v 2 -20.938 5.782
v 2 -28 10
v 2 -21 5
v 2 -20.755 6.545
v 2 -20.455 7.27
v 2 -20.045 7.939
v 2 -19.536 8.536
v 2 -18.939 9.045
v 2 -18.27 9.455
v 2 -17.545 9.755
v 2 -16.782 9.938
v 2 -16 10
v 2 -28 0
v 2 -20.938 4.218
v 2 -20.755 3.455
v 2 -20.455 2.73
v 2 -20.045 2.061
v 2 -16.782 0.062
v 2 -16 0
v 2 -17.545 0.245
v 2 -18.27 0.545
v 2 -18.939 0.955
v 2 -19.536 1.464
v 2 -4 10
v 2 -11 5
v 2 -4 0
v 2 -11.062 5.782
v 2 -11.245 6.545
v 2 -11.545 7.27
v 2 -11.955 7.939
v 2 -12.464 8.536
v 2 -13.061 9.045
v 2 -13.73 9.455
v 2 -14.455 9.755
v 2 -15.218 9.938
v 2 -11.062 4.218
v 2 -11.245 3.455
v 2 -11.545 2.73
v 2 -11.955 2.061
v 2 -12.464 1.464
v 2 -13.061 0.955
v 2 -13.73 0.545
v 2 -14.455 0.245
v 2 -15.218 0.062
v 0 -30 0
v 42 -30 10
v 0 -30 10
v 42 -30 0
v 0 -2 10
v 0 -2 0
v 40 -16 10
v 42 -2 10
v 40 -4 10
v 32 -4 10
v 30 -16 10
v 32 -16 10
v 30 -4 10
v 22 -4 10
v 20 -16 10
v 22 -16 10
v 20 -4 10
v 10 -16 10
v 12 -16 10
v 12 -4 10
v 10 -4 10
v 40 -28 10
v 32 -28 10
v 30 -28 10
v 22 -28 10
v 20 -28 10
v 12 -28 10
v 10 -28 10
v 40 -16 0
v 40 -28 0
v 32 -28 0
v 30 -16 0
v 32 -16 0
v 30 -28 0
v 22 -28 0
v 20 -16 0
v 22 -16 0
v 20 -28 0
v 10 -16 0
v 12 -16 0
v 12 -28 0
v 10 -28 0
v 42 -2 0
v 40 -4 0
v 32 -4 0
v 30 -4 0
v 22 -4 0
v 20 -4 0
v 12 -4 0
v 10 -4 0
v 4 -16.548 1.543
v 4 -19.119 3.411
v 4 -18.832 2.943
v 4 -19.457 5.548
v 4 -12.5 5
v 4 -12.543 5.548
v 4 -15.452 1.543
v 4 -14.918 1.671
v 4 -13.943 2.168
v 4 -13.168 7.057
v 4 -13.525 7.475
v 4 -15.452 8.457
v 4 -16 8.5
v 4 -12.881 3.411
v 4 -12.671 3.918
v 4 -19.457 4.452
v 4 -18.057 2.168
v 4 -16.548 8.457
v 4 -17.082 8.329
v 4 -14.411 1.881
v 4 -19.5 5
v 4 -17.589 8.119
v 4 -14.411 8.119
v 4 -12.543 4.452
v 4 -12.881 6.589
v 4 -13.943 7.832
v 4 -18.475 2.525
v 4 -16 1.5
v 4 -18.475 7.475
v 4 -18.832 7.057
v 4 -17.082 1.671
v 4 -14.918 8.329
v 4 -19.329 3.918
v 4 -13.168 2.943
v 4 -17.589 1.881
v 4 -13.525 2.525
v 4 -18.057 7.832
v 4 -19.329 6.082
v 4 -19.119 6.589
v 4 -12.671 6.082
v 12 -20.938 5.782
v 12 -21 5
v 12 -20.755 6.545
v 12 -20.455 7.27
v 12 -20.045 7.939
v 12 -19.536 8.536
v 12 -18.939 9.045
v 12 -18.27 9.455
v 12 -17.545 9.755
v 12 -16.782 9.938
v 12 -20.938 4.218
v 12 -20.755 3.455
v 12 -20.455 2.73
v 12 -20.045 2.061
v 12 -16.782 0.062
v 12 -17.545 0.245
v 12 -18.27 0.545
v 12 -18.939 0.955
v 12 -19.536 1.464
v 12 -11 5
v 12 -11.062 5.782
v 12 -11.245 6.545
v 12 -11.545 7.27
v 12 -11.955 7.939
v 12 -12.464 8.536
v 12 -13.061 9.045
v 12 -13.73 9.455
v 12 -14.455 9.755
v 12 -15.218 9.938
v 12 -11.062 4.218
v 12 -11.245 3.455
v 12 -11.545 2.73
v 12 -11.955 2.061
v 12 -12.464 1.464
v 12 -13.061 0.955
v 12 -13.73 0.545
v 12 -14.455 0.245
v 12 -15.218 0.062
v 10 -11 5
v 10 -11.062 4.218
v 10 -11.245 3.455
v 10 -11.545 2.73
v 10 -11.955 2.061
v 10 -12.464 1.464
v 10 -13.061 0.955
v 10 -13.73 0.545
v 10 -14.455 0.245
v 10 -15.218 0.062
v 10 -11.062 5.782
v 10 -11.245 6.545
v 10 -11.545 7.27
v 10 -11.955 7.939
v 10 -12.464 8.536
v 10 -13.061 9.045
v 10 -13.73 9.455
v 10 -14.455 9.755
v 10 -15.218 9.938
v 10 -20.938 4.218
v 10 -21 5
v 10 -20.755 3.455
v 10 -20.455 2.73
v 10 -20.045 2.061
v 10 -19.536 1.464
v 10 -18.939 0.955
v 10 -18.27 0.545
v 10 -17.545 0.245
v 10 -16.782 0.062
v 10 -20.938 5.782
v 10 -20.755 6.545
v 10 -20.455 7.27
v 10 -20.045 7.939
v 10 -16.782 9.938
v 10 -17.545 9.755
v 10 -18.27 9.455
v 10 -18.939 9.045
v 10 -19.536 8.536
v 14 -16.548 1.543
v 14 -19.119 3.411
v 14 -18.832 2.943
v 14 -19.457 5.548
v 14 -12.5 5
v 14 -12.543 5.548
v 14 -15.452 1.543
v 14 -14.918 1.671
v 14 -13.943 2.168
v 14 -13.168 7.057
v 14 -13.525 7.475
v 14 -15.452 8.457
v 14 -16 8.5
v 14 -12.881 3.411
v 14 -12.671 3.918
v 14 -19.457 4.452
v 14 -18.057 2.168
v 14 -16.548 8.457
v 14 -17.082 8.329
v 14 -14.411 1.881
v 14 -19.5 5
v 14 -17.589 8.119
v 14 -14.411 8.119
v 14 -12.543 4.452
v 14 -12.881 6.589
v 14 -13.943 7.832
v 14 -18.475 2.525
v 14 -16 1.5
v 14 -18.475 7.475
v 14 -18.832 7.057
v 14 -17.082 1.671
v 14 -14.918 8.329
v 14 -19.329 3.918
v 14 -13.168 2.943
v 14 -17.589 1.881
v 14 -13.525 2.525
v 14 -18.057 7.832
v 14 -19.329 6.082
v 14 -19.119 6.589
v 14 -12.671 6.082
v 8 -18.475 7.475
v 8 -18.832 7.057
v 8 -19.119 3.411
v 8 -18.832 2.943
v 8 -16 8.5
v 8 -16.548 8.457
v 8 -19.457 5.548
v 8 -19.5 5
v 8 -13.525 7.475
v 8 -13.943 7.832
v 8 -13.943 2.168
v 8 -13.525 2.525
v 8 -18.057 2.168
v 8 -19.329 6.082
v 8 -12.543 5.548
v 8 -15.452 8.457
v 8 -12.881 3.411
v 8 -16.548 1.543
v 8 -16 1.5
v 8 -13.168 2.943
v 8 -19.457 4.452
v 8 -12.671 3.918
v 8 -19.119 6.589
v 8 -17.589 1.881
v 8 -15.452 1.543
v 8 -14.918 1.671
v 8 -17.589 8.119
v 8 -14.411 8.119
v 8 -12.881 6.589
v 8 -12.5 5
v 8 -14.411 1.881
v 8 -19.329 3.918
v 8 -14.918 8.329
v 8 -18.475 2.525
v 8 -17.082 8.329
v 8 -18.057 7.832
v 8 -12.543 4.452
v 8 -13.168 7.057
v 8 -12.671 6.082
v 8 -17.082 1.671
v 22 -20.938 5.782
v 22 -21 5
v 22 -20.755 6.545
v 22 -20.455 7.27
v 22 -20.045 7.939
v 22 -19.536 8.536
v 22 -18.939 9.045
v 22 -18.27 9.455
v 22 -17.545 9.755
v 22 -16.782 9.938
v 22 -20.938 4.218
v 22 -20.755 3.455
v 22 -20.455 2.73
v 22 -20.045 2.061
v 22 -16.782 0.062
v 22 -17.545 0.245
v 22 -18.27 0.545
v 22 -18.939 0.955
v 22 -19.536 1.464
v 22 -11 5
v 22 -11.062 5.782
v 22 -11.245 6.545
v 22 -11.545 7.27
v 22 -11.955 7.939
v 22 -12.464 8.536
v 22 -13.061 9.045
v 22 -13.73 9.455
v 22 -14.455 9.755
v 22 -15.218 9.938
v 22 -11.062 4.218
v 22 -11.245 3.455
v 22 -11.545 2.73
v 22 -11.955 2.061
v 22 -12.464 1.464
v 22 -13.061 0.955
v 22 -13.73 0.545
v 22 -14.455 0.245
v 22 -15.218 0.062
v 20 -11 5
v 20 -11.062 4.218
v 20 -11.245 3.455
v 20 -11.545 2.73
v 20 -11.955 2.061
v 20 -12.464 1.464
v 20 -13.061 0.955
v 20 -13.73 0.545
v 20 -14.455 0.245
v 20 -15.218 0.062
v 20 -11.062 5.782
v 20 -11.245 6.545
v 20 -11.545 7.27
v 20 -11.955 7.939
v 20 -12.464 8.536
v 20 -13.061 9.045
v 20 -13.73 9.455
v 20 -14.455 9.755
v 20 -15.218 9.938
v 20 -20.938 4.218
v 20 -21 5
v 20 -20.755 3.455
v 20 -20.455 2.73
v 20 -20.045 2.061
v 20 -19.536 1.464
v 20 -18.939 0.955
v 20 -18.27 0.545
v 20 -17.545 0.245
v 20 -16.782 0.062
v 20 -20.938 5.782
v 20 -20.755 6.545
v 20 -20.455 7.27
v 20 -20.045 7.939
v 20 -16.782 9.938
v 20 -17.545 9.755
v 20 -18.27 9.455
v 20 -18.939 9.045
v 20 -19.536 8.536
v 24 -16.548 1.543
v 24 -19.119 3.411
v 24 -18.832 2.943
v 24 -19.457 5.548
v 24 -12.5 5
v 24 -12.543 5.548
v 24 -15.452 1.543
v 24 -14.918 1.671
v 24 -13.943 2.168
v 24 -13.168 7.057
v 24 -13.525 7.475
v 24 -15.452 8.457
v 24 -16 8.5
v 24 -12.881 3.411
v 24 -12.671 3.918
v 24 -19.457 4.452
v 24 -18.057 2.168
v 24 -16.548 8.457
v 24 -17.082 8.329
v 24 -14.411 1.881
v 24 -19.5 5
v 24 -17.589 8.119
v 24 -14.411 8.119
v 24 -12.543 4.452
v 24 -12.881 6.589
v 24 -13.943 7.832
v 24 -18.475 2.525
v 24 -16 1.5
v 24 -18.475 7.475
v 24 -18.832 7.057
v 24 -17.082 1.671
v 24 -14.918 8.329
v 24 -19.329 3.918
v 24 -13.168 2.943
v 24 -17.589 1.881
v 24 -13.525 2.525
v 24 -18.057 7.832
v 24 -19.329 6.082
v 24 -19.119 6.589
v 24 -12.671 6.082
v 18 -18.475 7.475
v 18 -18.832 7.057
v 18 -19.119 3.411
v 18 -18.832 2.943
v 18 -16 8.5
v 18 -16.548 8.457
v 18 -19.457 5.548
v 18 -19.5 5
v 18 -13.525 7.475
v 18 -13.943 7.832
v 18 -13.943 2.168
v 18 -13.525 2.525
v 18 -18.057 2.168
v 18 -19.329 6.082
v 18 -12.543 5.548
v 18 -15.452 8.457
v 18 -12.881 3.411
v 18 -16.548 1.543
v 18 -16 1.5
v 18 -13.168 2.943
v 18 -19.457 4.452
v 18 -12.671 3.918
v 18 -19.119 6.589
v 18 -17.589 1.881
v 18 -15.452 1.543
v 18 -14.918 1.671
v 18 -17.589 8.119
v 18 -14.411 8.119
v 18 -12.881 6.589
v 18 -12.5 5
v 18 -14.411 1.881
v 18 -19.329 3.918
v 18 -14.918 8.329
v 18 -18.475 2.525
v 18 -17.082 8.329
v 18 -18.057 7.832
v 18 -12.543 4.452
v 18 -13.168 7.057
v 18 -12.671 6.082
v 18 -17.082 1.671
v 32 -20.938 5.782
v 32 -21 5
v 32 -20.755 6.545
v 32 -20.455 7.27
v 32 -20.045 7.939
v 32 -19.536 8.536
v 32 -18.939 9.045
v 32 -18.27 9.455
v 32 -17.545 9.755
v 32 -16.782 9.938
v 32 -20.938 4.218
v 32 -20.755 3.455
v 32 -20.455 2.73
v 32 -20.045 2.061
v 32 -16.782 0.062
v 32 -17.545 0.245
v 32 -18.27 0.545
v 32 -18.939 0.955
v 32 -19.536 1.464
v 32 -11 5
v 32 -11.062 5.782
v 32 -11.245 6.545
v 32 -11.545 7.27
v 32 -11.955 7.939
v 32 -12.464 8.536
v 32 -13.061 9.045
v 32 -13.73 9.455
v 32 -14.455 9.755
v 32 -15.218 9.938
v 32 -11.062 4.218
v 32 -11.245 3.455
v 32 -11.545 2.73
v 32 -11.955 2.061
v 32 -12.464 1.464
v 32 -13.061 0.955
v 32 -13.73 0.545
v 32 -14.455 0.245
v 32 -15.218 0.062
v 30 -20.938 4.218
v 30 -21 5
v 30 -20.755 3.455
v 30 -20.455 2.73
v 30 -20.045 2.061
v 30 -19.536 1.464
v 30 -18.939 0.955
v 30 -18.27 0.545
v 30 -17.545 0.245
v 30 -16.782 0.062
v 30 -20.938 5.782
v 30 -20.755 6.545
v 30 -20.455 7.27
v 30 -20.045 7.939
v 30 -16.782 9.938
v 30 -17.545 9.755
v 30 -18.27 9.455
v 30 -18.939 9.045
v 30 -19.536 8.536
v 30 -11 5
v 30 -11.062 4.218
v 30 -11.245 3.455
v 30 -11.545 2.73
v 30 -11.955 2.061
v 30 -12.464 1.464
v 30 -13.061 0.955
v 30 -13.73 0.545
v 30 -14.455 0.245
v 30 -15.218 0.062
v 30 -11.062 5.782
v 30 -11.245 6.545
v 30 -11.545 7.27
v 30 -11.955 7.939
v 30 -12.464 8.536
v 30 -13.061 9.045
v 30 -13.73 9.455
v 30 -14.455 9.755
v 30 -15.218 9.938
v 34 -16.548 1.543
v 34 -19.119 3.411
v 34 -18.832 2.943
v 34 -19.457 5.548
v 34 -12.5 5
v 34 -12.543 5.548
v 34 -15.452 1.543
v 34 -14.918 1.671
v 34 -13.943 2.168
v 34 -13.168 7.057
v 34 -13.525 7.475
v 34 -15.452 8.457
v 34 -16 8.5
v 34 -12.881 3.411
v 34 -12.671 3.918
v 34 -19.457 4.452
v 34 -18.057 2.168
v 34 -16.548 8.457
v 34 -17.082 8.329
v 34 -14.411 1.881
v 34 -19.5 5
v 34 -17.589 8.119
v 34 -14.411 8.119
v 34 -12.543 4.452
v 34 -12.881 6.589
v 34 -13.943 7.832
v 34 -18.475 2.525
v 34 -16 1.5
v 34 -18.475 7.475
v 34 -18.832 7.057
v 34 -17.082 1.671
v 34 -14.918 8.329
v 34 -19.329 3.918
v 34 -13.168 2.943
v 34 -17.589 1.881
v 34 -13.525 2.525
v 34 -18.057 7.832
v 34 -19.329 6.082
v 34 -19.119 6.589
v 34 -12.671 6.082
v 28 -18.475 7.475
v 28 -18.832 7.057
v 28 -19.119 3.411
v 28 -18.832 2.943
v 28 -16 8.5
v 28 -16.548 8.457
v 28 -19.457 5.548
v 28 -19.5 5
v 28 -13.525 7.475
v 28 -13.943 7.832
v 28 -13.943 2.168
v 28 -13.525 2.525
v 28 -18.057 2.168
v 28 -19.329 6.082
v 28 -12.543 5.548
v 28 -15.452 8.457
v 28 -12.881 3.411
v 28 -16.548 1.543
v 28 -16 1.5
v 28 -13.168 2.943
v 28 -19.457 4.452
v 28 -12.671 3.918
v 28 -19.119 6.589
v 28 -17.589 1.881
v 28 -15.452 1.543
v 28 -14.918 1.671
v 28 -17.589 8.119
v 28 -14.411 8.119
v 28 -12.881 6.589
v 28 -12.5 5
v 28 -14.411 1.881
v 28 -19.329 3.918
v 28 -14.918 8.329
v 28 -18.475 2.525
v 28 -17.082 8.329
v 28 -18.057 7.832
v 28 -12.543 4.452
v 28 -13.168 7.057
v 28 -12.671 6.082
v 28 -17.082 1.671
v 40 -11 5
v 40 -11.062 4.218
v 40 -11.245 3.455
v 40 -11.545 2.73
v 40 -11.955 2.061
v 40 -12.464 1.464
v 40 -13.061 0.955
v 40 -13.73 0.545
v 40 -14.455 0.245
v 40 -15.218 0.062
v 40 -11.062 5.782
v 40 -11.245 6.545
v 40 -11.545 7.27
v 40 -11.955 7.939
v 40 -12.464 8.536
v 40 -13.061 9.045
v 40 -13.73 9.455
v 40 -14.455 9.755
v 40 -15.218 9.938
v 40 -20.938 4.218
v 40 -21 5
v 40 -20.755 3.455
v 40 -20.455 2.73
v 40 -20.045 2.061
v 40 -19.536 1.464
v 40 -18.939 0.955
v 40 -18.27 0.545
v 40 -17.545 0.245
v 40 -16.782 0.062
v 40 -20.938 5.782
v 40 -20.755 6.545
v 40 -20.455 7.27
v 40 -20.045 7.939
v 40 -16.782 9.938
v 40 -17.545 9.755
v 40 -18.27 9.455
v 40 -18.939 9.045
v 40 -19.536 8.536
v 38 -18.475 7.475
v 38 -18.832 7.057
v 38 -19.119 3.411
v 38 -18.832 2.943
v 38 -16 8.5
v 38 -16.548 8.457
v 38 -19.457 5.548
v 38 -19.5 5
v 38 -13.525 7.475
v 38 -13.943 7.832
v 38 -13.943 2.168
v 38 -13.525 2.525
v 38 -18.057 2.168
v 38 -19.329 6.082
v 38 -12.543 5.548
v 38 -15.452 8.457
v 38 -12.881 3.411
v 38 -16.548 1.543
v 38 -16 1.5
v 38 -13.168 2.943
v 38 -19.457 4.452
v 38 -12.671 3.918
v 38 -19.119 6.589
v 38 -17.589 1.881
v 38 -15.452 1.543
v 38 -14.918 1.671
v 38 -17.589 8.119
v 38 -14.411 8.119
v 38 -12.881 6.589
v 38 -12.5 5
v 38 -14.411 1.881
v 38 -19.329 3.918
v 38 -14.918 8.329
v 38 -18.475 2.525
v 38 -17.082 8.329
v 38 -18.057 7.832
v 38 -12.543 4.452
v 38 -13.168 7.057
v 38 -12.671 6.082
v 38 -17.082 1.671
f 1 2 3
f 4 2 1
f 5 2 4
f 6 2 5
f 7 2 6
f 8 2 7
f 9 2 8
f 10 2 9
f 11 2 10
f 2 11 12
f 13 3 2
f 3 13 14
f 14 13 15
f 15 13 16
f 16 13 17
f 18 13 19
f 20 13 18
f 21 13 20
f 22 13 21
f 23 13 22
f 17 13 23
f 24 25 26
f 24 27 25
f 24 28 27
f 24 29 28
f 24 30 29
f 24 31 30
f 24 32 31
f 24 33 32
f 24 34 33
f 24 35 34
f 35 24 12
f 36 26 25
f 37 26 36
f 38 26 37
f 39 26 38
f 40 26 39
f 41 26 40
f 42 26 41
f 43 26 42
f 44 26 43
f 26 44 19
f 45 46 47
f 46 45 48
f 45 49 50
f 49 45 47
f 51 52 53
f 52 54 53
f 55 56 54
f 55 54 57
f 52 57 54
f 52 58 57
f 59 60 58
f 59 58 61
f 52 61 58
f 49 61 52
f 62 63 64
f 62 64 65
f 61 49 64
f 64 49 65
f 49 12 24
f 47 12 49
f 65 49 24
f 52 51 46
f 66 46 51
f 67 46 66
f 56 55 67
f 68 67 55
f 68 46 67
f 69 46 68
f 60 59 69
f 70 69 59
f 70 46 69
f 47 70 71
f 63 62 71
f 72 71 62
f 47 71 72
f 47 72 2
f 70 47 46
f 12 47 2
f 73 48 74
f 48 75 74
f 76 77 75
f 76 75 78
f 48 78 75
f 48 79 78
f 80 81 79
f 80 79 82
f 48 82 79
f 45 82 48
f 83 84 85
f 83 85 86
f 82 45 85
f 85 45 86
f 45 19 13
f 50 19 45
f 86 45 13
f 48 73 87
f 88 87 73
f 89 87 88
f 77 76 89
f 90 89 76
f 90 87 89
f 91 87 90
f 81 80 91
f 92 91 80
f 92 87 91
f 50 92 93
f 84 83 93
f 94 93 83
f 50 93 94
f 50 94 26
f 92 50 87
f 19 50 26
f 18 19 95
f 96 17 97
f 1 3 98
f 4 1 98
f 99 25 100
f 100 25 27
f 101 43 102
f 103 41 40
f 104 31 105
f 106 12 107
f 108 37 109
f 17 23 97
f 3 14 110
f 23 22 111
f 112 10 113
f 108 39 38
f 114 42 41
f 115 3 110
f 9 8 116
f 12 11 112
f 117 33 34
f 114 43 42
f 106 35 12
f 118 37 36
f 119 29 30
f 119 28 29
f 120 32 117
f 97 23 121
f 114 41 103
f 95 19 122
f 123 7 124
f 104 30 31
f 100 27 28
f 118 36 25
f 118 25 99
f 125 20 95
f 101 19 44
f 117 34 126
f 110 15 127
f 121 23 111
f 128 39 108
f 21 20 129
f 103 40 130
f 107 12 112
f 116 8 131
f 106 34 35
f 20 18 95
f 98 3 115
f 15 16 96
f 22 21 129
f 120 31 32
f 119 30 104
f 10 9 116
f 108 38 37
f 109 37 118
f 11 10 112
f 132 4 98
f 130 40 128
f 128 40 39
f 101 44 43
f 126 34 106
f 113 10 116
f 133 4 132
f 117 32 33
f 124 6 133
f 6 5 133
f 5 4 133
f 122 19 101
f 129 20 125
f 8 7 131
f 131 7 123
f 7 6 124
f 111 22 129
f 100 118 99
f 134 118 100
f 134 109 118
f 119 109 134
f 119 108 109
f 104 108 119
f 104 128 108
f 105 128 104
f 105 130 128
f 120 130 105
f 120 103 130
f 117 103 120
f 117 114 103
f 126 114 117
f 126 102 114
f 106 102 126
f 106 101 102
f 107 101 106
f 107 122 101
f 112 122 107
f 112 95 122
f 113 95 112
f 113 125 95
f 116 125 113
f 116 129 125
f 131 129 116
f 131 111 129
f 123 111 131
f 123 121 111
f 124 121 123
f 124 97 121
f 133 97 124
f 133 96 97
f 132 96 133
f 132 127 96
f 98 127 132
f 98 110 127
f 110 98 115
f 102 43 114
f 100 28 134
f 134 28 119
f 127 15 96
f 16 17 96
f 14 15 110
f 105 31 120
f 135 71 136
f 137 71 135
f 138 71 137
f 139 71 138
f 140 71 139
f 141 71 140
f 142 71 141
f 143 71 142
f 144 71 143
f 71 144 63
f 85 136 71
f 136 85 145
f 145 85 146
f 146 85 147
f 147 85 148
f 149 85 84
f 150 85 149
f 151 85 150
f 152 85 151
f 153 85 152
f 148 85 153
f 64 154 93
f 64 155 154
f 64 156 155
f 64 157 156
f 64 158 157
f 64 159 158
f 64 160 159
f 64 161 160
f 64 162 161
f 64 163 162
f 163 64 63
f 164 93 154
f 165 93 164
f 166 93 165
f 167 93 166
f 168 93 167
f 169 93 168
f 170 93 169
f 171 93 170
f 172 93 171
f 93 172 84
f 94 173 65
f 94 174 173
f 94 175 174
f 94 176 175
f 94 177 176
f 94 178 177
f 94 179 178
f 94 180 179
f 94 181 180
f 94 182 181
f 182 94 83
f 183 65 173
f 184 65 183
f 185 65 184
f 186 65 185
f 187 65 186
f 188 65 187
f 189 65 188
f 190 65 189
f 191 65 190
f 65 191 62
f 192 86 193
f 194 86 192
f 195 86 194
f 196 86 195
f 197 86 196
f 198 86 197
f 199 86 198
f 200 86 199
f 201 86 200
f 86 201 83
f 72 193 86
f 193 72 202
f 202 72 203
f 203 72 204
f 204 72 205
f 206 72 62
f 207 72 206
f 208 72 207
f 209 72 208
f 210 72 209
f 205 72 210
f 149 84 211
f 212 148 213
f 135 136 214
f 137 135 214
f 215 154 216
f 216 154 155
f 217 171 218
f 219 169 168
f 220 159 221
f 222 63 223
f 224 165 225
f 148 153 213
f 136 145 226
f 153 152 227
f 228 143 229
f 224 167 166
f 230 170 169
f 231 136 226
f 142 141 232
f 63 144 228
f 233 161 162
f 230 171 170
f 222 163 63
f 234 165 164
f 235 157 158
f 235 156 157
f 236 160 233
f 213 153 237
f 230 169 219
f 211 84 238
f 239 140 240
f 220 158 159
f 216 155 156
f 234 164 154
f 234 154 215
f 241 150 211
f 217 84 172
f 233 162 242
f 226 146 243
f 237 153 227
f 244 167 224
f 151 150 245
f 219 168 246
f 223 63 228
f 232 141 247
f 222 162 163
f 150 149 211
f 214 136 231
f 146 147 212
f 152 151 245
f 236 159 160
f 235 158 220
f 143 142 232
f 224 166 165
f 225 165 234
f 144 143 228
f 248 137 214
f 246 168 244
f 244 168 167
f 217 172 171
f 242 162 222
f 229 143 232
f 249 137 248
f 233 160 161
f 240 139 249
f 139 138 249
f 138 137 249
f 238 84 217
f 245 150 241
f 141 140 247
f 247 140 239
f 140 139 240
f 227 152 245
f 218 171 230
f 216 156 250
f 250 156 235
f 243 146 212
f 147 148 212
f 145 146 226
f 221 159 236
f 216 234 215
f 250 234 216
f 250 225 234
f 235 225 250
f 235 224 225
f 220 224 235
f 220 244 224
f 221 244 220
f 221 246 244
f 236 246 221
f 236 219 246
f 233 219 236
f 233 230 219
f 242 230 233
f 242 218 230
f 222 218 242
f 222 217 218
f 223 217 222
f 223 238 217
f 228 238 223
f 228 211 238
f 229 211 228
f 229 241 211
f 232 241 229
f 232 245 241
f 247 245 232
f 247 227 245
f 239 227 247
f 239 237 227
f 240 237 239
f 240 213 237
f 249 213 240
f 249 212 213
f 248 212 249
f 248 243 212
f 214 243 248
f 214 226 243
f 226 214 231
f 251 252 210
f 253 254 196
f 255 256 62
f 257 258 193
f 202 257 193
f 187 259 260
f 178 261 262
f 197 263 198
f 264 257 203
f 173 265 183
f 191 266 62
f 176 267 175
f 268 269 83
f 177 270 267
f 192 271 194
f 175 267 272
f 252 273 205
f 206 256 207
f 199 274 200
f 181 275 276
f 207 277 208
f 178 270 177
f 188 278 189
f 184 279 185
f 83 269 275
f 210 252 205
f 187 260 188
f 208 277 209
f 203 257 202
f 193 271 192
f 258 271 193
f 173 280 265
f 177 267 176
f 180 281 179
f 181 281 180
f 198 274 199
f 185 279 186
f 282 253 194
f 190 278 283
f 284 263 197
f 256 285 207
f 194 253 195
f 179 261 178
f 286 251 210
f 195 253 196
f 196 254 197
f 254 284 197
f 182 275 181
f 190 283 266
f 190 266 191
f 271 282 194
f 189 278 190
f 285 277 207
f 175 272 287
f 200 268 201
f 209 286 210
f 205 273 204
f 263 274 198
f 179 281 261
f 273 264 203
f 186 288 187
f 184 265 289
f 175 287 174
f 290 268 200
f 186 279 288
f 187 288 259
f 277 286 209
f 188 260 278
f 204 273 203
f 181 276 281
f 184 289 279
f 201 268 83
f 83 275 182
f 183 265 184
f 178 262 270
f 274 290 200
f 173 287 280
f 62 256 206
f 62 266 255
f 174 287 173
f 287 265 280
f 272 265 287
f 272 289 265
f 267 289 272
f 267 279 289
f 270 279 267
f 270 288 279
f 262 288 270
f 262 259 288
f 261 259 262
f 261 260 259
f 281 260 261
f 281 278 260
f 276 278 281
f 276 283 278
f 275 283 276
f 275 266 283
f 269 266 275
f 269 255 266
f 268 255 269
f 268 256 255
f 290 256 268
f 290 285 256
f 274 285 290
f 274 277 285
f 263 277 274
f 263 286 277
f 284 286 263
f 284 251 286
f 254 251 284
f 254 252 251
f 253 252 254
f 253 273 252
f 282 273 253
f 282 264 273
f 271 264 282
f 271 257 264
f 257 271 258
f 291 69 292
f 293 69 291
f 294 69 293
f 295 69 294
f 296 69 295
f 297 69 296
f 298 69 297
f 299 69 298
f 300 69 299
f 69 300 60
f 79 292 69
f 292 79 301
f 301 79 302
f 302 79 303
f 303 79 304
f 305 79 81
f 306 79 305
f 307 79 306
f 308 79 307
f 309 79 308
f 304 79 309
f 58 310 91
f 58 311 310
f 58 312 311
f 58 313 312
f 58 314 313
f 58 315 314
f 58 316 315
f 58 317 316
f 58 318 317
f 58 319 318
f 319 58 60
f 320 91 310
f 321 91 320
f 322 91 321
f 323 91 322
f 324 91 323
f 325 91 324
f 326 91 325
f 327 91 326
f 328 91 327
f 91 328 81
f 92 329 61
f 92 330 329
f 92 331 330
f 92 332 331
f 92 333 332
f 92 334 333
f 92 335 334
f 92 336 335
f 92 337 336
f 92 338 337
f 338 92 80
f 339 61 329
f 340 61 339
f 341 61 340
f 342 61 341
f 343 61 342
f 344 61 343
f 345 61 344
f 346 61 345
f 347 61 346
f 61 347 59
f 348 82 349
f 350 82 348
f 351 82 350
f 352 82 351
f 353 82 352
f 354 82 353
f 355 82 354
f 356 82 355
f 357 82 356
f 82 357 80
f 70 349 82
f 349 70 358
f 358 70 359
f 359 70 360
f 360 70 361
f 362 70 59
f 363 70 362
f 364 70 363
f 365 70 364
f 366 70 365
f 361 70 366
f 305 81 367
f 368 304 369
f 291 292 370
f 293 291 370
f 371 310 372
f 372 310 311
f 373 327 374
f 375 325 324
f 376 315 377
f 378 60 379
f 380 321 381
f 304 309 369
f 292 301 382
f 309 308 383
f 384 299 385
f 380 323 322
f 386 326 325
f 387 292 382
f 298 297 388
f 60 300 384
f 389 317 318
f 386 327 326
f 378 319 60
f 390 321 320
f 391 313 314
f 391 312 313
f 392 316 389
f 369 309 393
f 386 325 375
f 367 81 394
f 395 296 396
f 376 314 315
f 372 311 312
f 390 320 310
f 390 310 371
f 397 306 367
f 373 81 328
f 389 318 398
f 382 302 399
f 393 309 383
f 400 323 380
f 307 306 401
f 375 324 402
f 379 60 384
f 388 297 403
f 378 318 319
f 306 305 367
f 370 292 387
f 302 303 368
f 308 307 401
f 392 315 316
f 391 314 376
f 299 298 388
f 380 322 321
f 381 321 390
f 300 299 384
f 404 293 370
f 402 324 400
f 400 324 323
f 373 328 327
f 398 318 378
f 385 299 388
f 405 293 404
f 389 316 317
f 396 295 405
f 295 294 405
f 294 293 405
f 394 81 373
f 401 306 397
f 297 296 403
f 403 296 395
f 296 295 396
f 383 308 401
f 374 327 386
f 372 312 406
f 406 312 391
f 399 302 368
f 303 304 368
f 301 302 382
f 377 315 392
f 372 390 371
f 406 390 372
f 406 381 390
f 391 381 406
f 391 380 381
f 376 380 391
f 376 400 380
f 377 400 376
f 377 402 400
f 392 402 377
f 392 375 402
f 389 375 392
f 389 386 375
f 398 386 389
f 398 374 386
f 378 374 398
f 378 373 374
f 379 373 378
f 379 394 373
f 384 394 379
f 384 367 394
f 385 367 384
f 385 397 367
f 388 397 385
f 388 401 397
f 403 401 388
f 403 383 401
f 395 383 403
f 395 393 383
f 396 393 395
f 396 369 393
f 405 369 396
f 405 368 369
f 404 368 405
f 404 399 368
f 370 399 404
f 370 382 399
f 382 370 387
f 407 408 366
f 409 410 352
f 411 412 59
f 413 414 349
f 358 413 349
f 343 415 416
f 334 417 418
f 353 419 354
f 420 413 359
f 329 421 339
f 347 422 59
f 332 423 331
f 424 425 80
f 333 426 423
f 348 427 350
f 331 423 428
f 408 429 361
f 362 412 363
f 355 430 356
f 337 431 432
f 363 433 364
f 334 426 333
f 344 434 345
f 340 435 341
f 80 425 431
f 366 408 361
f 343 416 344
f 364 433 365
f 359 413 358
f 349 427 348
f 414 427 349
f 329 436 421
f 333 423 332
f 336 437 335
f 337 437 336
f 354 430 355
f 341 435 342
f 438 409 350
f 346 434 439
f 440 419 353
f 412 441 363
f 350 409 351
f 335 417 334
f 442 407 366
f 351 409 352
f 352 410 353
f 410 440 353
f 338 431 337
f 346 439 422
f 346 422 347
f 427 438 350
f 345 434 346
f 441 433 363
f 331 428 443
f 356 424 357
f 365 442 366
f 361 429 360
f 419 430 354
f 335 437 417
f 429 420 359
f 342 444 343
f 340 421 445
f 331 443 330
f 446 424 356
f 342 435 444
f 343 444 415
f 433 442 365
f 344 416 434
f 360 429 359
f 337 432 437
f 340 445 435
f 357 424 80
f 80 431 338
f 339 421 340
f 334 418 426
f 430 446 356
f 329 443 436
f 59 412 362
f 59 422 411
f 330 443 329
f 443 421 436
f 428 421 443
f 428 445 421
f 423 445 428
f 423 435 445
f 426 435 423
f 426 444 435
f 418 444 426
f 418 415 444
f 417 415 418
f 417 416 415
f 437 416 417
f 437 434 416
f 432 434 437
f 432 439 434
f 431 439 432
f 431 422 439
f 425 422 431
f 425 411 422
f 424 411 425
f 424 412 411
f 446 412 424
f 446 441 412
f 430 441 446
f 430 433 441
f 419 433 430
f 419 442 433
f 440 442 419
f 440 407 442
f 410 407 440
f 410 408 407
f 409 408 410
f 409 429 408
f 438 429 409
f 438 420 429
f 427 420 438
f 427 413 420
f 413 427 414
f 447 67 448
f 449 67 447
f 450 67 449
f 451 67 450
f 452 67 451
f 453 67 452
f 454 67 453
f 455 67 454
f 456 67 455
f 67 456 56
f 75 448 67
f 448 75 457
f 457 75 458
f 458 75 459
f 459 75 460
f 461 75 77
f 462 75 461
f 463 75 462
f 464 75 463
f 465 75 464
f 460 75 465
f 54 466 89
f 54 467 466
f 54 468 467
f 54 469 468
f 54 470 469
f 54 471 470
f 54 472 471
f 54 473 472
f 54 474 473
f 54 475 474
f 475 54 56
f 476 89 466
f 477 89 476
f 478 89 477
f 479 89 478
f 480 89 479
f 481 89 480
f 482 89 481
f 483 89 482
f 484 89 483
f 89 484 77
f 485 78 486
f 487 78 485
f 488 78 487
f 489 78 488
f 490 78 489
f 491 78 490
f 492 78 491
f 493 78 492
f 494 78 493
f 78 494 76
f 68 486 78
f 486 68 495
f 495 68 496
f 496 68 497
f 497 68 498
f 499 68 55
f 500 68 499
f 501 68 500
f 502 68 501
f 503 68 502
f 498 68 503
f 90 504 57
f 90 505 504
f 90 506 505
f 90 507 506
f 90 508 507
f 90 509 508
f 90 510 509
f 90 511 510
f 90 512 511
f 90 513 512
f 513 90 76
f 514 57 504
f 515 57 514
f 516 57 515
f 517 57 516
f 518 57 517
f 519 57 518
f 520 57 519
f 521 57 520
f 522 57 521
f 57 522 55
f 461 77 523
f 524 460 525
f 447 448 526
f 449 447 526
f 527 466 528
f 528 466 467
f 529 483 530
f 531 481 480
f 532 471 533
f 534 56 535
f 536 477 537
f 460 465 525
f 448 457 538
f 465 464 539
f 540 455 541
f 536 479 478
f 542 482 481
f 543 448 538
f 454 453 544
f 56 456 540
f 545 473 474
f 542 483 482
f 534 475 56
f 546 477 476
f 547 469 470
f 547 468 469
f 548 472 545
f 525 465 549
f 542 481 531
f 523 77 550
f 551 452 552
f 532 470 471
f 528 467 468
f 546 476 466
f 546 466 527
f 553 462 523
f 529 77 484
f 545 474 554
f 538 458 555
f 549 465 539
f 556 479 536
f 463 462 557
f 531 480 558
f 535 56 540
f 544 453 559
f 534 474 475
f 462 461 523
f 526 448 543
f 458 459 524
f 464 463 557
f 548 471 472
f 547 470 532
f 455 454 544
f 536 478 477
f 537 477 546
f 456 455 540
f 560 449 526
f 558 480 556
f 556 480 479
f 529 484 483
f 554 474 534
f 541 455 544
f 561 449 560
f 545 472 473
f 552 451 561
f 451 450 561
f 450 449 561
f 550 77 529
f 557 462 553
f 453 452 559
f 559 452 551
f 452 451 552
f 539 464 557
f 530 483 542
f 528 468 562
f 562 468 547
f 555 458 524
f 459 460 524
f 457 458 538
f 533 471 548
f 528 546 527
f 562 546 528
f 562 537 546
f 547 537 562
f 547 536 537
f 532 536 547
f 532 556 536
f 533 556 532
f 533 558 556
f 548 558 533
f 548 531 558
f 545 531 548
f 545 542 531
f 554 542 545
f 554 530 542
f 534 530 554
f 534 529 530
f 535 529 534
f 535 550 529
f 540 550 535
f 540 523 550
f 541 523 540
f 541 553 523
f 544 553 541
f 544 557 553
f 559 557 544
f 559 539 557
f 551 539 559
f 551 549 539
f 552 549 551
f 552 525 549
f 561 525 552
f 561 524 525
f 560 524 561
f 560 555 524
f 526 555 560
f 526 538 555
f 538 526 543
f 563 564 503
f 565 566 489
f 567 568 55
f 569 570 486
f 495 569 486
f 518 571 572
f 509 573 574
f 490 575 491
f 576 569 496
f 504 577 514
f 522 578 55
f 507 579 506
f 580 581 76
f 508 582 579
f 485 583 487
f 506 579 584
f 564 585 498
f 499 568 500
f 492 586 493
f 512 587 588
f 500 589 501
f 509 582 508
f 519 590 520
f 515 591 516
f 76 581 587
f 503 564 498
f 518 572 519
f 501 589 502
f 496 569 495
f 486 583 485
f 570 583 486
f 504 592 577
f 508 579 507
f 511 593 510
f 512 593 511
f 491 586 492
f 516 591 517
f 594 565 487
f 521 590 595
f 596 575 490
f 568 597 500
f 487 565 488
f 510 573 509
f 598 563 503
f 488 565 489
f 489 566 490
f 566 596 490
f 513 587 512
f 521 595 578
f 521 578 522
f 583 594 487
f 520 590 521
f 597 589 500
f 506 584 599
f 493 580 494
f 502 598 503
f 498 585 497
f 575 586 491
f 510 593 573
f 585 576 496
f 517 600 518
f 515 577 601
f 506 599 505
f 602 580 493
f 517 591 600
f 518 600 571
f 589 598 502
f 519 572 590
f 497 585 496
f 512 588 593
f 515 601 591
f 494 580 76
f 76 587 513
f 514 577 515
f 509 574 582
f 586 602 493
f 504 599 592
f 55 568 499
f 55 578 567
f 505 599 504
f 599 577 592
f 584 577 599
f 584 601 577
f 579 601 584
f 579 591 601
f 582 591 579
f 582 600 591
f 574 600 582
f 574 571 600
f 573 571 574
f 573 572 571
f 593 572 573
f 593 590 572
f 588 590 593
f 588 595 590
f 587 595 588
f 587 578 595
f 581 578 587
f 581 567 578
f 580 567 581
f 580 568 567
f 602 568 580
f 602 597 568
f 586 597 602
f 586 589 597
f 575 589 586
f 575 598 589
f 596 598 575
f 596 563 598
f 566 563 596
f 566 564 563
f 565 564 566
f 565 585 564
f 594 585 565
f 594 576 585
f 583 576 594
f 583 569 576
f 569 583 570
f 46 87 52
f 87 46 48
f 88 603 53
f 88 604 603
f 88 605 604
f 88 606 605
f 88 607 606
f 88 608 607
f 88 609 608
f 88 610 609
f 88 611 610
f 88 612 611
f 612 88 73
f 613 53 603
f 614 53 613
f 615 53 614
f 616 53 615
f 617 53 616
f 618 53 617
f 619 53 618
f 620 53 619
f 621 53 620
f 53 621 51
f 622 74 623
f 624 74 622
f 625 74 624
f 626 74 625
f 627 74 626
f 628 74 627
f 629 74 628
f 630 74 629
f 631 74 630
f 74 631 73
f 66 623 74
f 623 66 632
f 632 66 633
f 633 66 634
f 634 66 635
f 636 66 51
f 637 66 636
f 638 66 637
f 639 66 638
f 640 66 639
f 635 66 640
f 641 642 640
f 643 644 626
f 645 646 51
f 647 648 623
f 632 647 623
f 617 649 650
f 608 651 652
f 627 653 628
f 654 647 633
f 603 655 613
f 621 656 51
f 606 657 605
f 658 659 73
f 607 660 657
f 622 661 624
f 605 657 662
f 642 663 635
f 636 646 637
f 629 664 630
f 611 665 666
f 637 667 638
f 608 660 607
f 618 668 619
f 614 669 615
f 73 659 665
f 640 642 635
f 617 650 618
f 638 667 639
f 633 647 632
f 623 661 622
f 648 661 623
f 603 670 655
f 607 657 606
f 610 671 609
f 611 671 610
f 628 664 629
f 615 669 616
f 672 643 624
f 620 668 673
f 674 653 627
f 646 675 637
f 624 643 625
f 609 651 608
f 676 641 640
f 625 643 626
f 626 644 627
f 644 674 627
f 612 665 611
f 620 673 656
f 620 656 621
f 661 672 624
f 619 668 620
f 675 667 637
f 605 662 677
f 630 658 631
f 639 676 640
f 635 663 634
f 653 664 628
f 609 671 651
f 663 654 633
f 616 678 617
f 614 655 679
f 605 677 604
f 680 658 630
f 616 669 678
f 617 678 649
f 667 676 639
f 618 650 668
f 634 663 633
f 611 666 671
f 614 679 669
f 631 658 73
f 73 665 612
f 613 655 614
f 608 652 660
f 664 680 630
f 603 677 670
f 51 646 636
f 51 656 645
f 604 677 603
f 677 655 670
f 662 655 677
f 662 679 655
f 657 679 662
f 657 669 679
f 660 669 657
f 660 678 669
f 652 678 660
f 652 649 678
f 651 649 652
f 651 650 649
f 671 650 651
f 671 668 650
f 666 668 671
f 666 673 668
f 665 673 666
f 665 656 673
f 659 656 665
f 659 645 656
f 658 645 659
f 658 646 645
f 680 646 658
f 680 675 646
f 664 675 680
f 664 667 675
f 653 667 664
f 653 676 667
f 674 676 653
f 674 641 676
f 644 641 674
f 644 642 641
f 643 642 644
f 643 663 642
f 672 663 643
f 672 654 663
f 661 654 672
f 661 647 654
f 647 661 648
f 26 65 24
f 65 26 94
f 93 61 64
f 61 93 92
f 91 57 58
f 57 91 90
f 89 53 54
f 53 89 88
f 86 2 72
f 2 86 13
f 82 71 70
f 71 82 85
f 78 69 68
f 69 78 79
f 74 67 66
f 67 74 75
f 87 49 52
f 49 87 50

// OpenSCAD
rotate([90,0]) intersection(){ translate([0,0,2]) cube([42,10,30]);
difference(){
  union(){
    cube([102,10,4]);
    translate([0,0,28]) cube([102,10,2]);
    for(x=[0:10:100]) translate([x,0]) {
    cube([2,10,30]);
    translate([2,5,16]) rotate([0,90]) cylinder(d1=10,d2=7,h=2,$fn=40);
    translate([0,5,16]) rotate([0,-90]) cylinder(d1=10,d2=7,h=2,$fn=40);
    }
  }
  *translate([-.01,5,16]) rotate([0,90]) cylinder(d=8,h=110,$fn=40);
  }
}
*%for(x=[0:10:30]) translate([x,0])
translate([2.5,5,16]) rotate([0,90,0]) difference(){
  cylinder(d=22,h=7,$fn=50);
  translate([0,0,-.01]) cylinder(d=8,h=7.02,$fn=30);
}
